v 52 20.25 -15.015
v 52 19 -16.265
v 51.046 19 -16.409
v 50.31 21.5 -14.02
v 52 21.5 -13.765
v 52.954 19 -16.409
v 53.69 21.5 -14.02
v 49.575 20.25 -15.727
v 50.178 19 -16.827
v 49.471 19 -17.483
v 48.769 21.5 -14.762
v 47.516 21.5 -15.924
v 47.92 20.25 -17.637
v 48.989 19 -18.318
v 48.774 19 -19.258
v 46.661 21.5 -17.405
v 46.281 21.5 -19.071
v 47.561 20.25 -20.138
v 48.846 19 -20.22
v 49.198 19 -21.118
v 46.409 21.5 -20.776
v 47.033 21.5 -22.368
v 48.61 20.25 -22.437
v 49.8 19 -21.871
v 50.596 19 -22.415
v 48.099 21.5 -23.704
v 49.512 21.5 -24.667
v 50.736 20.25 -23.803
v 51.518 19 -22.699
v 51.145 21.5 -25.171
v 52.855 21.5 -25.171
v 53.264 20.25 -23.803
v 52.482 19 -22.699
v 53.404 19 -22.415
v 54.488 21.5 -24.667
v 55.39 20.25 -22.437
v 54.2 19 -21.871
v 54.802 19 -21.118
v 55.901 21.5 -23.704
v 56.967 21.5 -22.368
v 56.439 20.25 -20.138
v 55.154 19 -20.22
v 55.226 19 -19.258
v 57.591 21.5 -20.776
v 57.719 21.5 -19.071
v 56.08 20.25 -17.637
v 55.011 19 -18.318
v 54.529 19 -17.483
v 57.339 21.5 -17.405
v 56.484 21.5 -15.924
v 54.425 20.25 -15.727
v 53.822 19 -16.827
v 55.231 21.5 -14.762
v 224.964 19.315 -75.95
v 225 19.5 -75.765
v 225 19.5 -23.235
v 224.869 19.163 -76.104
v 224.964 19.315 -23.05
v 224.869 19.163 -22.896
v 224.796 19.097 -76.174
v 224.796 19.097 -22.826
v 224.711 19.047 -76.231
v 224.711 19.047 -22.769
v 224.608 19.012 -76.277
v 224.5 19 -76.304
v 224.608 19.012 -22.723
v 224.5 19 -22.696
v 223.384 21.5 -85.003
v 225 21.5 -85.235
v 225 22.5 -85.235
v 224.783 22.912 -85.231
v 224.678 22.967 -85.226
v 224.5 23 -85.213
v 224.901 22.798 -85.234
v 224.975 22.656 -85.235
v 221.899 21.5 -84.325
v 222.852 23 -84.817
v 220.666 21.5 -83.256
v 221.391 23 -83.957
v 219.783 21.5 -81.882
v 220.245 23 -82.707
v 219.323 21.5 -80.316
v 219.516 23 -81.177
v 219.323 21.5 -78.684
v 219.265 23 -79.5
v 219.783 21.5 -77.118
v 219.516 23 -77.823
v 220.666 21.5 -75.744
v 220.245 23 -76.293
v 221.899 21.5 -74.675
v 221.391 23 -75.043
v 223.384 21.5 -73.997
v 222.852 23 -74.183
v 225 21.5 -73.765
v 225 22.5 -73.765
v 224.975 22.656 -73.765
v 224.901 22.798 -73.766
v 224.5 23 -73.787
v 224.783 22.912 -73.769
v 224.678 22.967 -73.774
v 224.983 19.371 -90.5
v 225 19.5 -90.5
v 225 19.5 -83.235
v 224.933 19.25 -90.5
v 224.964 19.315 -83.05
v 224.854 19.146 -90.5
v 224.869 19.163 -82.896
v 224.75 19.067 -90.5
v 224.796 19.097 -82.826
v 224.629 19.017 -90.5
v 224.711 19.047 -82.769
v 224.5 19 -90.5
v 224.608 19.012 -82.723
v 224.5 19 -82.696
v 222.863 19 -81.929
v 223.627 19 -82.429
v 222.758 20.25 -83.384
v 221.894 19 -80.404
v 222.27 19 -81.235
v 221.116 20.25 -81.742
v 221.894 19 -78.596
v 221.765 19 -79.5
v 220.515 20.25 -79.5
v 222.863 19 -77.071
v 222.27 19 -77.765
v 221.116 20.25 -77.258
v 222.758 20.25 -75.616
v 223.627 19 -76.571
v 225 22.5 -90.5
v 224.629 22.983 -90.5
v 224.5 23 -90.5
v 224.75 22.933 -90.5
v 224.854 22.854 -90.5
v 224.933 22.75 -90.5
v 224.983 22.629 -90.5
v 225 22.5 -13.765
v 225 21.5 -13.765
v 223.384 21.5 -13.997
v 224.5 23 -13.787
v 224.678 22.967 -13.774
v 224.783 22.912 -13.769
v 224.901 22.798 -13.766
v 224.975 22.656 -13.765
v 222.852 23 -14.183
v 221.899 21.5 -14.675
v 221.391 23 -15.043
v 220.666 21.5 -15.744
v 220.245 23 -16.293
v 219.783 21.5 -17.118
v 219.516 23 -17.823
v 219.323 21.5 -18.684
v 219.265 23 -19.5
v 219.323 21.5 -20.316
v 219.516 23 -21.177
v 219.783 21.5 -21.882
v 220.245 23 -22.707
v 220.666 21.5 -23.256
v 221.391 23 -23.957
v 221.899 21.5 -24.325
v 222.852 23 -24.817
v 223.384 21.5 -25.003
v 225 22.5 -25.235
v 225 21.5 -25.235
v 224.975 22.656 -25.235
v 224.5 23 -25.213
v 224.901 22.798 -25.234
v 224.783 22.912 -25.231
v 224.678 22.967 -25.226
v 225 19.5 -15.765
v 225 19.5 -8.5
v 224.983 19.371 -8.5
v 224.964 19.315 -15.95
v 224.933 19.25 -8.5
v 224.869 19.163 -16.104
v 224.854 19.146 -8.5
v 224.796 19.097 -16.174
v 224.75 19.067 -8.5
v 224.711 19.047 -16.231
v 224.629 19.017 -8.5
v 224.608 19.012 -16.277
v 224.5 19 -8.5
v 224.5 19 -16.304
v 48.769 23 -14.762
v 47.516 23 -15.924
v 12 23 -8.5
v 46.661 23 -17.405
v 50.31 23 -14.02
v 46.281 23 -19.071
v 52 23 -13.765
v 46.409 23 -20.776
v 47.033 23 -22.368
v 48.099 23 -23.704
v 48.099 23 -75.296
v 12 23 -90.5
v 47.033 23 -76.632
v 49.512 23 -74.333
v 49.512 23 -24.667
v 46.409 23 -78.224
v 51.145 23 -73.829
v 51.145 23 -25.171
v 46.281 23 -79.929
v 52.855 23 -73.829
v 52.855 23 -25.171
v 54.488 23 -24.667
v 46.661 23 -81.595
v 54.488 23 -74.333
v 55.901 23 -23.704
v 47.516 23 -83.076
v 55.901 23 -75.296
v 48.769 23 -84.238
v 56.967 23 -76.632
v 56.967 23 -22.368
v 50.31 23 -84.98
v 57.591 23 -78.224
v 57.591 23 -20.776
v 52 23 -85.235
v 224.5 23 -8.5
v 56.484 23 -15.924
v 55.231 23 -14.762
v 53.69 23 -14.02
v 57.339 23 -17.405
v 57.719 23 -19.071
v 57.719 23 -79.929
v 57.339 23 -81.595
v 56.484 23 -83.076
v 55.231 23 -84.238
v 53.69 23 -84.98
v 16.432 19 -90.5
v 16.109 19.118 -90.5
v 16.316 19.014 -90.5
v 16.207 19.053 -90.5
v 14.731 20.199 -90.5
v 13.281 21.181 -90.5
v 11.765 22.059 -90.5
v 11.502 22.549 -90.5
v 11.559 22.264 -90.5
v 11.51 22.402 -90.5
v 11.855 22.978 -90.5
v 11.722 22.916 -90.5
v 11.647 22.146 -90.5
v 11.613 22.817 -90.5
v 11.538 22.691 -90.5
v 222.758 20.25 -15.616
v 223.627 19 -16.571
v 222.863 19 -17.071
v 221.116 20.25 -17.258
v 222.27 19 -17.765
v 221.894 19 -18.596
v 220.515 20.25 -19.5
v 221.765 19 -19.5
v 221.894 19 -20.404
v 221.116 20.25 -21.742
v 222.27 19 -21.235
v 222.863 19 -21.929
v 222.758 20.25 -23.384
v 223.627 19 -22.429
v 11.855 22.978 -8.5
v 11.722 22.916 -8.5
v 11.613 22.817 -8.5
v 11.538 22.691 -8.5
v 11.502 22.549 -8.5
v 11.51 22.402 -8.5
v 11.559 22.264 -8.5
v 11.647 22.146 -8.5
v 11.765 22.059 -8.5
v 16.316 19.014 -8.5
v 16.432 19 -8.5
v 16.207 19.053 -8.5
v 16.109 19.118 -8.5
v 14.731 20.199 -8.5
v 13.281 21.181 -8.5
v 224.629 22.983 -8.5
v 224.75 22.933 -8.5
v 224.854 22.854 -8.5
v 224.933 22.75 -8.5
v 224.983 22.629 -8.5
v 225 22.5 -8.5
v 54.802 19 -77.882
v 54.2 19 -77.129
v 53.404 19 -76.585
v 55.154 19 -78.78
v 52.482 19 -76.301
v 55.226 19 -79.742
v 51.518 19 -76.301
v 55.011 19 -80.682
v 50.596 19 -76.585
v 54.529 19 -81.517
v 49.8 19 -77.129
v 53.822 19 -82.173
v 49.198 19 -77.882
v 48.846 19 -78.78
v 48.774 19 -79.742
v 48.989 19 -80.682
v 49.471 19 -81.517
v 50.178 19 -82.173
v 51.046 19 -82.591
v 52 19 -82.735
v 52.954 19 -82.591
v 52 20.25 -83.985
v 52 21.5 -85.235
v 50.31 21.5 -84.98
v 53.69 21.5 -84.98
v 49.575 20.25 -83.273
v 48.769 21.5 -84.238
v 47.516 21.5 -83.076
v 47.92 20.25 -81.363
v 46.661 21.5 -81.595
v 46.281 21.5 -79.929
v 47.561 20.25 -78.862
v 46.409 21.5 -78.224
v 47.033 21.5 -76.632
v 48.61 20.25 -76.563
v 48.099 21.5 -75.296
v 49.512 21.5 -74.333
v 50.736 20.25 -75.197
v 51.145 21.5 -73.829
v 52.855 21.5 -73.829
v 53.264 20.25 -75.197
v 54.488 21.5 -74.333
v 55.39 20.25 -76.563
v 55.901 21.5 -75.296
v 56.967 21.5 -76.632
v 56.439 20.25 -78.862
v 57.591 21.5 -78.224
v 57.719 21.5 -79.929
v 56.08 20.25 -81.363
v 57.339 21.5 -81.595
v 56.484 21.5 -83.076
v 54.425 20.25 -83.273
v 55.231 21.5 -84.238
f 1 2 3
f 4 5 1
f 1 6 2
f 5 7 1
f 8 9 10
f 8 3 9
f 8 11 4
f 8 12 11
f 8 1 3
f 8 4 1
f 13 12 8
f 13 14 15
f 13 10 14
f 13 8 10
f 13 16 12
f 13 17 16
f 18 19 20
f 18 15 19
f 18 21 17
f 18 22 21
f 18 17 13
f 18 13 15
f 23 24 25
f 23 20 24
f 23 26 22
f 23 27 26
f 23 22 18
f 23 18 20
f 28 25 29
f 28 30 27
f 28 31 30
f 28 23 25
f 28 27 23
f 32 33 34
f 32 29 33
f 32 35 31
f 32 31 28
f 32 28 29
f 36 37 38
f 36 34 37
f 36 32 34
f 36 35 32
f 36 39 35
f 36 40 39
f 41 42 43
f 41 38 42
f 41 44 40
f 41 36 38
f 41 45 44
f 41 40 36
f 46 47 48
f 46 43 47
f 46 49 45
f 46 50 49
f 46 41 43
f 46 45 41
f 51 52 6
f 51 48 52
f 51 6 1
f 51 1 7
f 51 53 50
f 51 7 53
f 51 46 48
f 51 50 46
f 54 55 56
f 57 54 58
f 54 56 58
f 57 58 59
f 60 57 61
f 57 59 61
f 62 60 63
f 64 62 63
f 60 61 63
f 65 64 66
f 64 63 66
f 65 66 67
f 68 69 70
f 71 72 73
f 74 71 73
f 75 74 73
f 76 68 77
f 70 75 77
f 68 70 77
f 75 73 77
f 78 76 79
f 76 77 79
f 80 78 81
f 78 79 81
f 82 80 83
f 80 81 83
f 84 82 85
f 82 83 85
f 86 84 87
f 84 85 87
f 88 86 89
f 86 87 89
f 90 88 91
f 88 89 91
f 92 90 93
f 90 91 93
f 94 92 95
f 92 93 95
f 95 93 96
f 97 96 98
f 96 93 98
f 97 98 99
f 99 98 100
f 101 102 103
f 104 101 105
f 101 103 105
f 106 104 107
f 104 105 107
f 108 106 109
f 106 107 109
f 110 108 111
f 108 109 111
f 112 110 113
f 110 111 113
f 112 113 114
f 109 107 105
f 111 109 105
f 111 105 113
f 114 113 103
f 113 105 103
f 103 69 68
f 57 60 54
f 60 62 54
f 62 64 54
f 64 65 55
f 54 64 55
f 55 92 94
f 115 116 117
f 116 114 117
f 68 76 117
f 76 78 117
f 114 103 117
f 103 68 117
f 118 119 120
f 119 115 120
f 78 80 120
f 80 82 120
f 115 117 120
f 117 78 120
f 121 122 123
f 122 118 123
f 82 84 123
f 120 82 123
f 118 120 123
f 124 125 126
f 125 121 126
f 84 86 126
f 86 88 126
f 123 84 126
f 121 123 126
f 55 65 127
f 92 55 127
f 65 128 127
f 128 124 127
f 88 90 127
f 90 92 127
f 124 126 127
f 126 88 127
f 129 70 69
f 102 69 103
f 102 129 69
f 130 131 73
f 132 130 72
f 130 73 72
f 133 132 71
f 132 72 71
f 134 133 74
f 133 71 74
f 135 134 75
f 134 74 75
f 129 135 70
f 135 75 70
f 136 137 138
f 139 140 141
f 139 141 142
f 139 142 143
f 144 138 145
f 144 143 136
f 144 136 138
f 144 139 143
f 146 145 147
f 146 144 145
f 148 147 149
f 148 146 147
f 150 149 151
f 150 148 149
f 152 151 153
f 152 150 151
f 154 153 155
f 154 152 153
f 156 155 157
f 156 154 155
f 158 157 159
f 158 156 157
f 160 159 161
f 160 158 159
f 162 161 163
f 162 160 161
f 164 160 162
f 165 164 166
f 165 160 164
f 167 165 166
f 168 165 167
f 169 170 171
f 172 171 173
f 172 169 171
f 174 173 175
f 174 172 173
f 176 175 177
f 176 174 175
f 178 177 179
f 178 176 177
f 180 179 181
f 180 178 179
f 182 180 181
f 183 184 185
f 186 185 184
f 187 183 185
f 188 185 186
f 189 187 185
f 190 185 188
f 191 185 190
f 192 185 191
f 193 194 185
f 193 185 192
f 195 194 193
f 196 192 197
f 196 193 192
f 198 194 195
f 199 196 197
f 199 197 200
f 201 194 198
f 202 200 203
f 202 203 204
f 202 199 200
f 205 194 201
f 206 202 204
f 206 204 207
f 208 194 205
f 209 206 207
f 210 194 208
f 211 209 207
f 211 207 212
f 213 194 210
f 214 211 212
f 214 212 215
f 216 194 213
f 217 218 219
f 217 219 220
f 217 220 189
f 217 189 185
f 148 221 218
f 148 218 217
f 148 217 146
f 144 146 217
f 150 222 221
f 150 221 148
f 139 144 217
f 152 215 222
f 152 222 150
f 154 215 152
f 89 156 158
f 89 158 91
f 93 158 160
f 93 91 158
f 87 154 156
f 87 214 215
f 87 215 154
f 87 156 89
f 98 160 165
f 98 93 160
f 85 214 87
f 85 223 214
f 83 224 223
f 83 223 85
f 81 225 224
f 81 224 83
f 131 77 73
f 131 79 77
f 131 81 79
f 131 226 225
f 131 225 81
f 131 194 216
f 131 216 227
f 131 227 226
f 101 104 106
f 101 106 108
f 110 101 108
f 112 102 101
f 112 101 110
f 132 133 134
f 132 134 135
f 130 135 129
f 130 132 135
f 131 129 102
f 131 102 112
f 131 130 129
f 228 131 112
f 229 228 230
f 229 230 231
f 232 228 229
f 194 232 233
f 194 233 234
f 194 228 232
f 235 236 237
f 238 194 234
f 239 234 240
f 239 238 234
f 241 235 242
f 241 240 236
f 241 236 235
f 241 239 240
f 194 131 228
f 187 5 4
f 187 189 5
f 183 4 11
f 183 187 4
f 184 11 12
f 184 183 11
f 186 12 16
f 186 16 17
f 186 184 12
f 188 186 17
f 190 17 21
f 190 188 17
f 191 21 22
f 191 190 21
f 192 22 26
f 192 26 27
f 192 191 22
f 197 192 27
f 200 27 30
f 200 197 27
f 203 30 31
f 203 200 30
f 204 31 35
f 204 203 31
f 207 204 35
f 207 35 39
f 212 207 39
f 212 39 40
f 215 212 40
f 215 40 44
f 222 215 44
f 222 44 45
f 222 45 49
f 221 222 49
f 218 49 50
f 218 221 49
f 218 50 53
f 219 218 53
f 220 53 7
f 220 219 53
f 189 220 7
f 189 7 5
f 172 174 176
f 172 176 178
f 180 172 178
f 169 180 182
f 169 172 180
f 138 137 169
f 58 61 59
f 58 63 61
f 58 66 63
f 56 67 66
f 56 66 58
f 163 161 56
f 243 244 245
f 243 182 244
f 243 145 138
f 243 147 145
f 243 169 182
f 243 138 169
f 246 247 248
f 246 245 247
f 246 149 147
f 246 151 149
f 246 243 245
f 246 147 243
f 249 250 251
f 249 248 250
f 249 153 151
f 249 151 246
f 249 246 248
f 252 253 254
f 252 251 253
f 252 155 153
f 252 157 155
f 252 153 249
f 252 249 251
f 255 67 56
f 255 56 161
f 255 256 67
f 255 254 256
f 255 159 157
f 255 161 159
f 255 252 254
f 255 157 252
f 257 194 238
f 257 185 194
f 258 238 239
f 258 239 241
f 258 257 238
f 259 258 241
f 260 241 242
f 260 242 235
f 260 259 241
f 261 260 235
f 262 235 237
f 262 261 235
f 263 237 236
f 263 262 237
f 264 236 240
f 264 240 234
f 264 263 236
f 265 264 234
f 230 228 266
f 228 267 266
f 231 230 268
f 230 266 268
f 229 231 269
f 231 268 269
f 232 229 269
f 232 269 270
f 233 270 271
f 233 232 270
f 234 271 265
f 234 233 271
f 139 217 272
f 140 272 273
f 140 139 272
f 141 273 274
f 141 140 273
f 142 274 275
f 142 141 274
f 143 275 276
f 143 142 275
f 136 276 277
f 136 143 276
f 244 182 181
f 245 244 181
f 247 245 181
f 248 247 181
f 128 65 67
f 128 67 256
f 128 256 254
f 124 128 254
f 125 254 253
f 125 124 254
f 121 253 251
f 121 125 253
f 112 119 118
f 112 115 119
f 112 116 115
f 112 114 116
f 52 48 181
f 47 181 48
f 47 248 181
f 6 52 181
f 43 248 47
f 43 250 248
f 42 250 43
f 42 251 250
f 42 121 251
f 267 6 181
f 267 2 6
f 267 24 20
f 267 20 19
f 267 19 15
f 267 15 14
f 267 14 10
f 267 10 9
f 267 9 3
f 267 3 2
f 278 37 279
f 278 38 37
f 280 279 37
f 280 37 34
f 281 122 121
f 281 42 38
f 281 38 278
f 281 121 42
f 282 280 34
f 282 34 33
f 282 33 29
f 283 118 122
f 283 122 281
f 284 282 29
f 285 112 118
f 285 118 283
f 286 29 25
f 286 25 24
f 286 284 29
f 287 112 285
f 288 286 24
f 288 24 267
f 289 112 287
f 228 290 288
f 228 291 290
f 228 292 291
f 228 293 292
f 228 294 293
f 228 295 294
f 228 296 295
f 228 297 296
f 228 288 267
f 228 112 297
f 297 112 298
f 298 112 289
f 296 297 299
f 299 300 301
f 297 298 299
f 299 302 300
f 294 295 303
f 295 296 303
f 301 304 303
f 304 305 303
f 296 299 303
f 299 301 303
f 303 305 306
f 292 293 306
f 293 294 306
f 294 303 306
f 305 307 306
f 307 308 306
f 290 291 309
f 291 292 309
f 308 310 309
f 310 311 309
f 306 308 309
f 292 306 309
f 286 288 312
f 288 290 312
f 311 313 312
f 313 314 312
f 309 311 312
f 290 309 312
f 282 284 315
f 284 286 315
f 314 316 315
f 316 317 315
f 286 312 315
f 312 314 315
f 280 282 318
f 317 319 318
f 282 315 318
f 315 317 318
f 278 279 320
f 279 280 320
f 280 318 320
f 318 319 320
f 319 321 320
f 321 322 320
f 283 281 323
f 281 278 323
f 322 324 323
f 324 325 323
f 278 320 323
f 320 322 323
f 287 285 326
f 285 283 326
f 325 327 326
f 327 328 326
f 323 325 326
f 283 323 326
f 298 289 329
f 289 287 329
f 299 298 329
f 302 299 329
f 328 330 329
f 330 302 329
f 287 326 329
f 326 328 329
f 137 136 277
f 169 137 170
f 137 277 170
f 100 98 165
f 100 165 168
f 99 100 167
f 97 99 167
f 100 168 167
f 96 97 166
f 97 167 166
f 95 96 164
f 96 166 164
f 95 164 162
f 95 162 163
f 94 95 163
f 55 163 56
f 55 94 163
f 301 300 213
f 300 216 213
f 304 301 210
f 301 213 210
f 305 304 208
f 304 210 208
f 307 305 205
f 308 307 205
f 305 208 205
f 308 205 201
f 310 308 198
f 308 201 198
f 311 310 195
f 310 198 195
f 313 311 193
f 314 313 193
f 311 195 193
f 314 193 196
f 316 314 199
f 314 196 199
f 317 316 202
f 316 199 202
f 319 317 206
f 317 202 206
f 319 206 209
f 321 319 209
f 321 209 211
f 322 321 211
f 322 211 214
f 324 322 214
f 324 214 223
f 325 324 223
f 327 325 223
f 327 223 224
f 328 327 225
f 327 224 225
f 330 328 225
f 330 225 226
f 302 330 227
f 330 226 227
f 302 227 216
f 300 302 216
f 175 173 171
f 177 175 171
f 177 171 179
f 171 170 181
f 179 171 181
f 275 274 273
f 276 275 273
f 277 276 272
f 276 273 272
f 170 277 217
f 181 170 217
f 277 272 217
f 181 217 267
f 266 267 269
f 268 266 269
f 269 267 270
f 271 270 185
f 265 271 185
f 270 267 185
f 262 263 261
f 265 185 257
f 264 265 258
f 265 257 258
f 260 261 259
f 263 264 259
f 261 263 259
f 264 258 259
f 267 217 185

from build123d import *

# Parameters (mm, degrees)
AUFSATZ_LINEAR_START                        = -8.5
AUFSATZ_LINEAR_AUSTRAGEN1_DEPTH             = 41
VERRUNDUNG1_R                               = 0.5
FORMSENKUNG_F_R_M5_SENKSCHRAUBE_MIT_2_COUNT = 2
FORMSENKUNG_F_R_M5_SENKSCHRAUBE_MIT_2_PITCH = 173


with BuildPart() as part:
    # Skizze2 → Aufsatz-Linear austragen1 (new body)
    with BuildSketch(Plane.XY.offset(AUFSATZ_LINEAR_START)):
        with BuildLine():
            Line((9.797958971, 23), (225, 23))
            Line((225, 23), (225, 19))
            Line((225, 19), (17.007351352, 19))
            Line((17.007351352, 19), (16.248076809, 19))
            ThreePointArc((16.248076809, 19), (13.175697134, 21.246199779), (9.797958971, 23))
        make_face()
    extrude(amount=-AUFSATZ_LINEAR_AUSTRAGEN1_DEPTH)

    # Verrundung1
    verrundung1_edges = [part.edges().sort_by_distance(p)[0] for p in [
        (16.248076809, 19, -29),
        (9.797958971, 23, -29),
        (225, 23, -29),
        (225, 19, -29),
    ]]
    fillet(verrundung1_edges, radius=VERRUNDUNG1_R)

    # Skizze6 → Formsenkung für M5 Senkschraube mit Innensechskant1 (revolve, cut)
    with BuildSketch(Plane(origin=(225, 23, -19.5), x_dir=(0, 0, 1), z_dir=(1, 0, 0))):
        Polygon((0, 0), (0, 5.652366702), (2.75, 4), (2.75, 4.485), (5.735, 1.5), (5.735, 0), align=None)
    formsenkung_f_r_m5_senkschraube_mit_inne = revolve(axis=Axis((225, 29.35, -19.5), (0, -1, 0)), mode=Mode.SUBTRACT)

    # Formsenkung f_r M5 Senkschraube mit  2: Formsenkung für M5 Senkschraube mit Innensechskant1 ×2
    with Locations(*[(-i * FORMSENKUNG_F_R_M5_SENKSCHRAUBE_MIT_2_PITCH, 0, 0) for i in range(1, FORMSENKUNG_F_R_M5_SENKSCHRAUBE_MIT_2_COUNT)]):
        add(formsenkung_f_r_m5_senkschraube_mit_inne, mode=Mode.SUBTRACT)

    # Spiegeln2: part across plane


with BuildPart() as part_1:
    add(part.part)
    add(part.part.mirror(Plane.XY.offset(-49.5)))


solid = part_1.part
